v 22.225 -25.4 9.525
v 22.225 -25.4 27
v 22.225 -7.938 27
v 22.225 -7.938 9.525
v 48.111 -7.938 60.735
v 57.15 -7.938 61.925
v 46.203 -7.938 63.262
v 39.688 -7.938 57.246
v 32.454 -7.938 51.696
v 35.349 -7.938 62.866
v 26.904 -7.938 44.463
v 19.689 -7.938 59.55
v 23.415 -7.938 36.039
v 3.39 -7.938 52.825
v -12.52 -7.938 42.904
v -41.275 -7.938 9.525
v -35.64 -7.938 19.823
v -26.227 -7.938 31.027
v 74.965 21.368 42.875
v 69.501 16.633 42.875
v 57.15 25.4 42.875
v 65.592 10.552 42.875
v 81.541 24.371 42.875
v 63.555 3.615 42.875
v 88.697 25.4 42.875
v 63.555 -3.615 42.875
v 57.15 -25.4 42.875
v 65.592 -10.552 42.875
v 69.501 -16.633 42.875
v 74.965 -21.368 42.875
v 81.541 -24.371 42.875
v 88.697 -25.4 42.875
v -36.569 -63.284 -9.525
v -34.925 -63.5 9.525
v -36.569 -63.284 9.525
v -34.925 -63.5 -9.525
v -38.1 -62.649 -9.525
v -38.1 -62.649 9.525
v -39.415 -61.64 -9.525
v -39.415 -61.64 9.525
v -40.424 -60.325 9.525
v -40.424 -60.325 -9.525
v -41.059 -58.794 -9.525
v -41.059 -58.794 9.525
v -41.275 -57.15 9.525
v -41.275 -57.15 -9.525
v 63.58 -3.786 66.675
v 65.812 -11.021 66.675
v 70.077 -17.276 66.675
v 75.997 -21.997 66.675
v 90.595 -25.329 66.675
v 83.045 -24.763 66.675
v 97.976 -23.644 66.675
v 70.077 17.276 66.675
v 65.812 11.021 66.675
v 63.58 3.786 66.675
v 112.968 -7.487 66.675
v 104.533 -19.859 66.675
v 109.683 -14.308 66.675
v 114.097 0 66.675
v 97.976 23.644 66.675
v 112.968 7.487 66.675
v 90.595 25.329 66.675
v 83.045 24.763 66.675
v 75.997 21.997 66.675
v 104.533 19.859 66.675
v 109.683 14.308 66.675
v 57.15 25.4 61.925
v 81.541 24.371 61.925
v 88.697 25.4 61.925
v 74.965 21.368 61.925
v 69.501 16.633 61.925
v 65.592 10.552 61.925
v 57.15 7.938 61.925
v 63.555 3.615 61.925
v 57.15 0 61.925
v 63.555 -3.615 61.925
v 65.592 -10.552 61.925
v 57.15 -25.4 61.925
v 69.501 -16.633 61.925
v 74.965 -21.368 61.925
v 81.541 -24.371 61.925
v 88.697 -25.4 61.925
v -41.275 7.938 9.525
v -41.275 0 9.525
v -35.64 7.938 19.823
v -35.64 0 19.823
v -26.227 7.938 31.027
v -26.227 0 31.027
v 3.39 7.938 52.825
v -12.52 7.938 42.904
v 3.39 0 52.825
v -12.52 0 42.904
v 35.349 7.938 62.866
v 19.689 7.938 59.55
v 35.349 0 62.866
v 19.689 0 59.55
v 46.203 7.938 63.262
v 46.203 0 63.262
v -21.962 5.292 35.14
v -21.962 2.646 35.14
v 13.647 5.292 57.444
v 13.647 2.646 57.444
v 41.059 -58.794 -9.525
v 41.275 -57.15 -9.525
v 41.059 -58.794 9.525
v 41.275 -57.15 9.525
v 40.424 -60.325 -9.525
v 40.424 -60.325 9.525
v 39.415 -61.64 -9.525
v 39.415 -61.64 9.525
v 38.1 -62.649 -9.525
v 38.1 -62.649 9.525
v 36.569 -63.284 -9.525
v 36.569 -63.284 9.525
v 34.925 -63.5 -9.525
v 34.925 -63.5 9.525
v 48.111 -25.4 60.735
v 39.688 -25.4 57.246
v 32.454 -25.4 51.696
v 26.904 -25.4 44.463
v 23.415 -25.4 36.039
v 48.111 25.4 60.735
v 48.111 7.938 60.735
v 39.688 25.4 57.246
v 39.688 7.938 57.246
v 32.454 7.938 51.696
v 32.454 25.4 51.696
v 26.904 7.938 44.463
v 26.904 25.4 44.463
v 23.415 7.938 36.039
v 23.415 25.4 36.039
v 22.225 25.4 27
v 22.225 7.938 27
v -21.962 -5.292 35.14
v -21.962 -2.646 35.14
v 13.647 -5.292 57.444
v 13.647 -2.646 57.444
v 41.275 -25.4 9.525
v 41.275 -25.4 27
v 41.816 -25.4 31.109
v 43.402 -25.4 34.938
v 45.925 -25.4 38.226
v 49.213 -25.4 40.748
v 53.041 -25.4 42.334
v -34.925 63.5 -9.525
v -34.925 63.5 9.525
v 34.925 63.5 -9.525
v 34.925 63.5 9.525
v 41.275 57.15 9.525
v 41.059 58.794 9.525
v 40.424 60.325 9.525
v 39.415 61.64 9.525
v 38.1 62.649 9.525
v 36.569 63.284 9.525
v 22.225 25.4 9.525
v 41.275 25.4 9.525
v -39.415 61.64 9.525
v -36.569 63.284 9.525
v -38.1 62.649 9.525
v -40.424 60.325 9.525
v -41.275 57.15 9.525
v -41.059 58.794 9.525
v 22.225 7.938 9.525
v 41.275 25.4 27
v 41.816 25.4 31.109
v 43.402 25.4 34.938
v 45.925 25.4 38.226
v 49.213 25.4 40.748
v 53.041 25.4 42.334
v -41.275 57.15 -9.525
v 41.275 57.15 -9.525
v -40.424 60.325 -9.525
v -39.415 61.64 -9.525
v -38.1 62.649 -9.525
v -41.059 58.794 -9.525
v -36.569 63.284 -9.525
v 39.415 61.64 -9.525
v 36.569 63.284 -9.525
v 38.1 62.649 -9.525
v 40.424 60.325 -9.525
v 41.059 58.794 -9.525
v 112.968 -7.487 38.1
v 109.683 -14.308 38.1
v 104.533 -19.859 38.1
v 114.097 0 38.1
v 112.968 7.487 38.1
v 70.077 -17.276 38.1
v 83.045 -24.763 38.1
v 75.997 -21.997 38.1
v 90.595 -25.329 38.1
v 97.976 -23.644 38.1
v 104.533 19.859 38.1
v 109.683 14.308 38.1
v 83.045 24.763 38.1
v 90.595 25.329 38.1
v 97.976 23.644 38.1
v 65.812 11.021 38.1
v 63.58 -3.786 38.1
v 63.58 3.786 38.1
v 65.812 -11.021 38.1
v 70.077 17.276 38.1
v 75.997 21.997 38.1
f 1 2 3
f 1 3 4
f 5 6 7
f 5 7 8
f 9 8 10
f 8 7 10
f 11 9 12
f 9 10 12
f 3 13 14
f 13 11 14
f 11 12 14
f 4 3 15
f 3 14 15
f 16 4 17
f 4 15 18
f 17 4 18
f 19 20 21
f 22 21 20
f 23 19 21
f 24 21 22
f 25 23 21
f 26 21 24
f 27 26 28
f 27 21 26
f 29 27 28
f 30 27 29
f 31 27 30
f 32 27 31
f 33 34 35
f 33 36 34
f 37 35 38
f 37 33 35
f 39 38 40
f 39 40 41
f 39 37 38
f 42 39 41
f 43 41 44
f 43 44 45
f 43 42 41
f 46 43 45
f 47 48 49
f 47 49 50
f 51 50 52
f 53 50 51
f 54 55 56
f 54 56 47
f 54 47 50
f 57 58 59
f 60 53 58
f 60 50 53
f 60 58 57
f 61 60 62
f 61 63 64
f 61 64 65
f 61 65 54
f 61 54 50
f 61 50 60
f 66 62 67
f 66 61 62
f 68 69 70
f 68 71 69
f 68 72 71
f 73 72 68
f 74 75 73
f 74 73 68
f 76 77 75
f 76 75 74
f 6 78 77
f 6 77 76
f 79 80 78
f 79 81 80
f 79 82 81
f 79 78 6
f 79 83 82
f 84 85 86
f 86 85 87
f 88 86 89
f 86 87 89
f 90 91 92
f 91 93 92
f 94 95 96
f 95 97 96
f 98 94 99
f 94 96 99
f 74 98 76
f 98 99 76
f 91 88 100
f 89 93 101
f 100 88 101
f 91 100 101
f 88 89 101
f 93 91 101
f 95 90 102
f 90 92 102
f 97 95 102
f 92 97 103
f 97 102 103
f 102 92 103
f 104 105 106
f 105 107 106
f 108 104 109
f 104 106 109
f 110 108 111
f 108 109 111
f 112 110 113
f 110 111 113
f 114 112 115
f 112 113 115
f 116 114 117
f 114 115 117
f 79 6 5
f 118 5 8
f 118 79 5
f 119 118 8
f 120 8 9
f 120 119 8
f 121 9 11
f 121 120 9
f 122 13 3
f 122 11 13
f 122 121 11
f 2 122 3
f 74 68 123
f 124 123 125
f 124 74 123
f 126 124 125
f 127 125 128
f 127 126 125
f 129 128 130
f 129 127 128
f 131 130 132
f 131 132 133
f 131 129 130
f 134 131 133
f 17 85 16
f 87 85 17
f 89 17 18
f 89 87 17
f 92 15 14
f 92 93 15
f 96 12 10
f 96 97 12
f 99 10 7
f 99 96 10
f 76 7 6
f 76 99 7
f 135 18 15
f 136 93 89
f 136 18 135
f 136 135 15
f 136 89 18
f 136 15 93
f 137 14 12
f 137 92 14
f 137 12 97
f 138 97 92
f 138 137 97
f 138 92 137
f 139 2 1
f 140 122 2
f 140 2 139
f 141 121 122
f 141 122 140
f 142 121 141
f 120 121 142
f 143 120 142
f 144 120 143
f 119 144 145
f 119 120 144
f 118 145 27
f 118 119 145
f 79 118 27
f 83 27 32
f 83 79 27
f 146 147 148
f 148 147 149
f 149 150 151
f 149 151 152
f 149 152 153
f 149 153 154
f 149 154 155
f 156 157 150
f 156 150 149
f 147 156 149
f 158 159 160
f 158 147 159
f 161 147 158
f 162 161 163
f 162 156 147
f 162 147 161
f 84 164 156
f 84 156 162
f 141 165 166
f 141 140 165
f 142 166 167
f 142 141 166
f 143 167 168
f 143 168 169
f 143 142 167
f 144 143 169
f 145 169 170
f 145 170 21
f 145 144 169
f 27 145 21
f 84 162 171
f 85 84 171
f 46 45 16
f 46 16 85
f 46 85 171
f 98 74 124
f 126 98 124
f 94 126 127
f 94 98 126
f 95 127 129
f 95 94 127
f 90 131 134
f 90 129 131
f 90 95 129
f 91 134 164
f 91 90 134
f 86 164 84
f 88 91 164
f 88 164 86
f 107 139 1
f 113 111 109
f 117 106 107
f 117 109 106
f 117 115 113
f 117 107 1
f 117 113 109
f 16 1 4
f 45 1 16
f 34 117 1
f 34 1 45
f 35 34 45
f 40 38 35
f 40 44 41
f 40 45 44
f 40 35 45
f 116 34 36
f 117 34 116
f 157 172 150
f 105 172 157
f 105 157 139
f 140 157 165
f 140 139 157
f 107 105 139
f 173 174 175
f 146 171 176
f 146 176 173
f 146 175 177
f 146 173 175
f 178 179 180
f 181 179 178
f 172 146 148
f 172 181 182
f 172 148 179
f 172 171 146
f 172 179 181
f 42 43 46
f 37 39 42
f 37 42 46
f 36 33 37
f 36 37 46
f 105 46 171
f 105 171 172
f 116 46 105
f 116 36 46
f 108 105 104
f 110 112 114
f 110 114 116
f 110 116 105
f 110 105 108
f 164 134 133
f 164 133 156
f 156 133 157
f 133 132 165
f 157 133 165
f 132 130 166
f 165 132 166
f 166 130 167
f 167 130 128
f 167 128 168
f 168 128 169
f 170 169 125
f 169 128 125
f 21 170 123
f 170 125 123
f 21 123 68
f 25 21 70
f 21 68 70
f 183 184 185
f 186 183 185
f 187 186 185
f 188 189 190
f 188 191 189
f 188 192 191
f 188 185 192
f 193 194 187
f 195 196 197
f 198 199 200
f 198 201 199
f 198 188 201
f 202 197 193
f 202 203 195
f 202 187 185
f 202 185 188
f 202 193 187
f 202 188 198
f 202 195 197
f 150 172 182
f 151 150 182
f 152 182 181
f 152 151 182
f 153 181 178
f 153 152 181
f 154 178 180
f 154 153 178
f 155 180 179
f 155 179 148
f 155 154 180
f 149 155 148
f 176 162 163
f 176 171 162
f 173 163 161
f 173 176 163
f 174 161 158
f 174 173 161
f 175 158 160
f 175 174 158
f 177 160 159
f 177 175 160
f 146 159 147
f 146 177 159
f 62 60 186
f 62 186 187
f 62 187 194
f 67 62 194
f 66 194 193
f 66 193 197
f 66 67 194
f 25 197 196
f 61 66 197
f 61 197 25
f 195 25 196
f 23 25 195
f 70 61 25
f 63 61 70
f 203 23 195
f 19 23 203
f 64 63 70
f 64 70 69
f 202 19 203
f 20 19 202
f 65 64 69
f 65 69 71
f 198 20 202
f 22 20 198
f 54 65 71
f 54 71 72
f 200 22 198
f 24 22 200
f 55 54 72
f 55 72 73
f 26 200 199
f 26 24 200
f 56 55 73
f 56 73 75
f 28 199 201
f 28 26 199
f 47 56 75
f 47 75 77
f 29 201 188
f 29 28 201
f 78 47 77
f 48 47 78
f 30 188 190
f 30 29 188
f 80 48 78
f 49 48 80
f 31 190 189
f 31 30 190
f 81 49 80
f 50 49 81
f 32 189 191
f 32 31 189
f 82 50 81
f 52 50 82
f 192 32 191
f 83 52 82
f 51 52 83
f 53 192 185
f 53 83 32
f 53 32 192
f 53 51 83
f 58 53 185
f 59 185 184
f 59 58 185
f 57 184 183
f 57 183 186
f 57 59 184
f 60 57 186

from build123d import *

# Parameters (mm, degrees)
F1_DEPTH = 63.5
F0_W     = 25.4
F0_H     = 19.05
F2_DEPTH = 25.4
F3_DEPTH = 7.9375
F5_R     = 6.35


with BuildPart() as f1:
    # F0 (on Front) → F1 (new body, symmetric)
    with BuildSketch(Plane.XZ):
        Polygon((-41.275, 9.525), (-41.275, -9.525), (41.275, -9.525), (41.275, 9.525), (22.225, 9.525), align=None)
    extrude(amount=F1_DEPTH, both=True)

    # F0 (on Front) → F2 (join, symmetric)
    with BuildSketch(Plane.XZ):
        with Locations((75.9968, 52.4002)):
            Rectangle(F0_W, F0_H)
        with BuildLine():
            Line((22.225, 9.525), (41.275, 9.525))
            Line((41.275, 9.525), (41.275, 27.0002))
            ThreePointArc((41.275, 27.0002), (45.9246798487, 38.2255201513), (57.15, 42.8752))
            Line((57.15, 42.8752), (63.2968, 42.8752))
            Line((63.2968, 42.8752), (63.2968, 61.9252))
            Line((63.2968, 61.9252), (57.15, 61.9252))
            ThreePointArc((57.15, 61.9252), (32.4542956671, 51.6959043329), (22.225, 27.0002))
            Line((22.225, 27.0002), (22.225, 9.525))
        make_face()
    extrude(amount=F2_DEPTH, both=True)

    # F0 (on Front) → F3 (join, symmetric)
    with BuildSketch(Plane.XZ):
        with BuildLine():
            add(Edge.make_bspline(
                [(-41.275, 9.525), (-32.9106339345, 31.9569138645), (12.5016221459, 71.1940555749), (57.15, 61.9252)],
                knots=[0, 0, 0, 0, 111.5045361635, 111.5045361635, 111.5045361635, 111.5045361635], degree=3))
            Line((-41.275, 9.525), (22.225, 9.525))
            Line((22.225, 9.525), (22.225, 27.0002))
            ThreePointArc((22.225, 27.0002), (32.4542956671, 51.6959043329), (57.15, 61.9252))
        make_face()
    extrude(amount=F3_DEPTH, both=True)

    # F0 (on Front) → F4 (revolve)
    with BuildSketch(Plane.XZ):
        Polygon((88.6968, 66.675), (88.6968, 61.9252), (88.6968, 42.8752), (88.6968, 38.1), (114.0968, 38.1), (114.0968, 66.675), align=None)
    revolve(axis=Axis((88.6968, 0, 52.3875), (0, 0, 1)))

    # F5
    f5_edges = [f1.edges().sort_by_distance(p)[0] for p in [
        (41.275, 63.5, 0),
        (-41.275, -63.5, 0),
        (-41.275, 63.5, 0),
        (41.275, -63.5, 0),
    ]]
    fillet(f5_edges, radius=F5_R)


solid = f1.part
